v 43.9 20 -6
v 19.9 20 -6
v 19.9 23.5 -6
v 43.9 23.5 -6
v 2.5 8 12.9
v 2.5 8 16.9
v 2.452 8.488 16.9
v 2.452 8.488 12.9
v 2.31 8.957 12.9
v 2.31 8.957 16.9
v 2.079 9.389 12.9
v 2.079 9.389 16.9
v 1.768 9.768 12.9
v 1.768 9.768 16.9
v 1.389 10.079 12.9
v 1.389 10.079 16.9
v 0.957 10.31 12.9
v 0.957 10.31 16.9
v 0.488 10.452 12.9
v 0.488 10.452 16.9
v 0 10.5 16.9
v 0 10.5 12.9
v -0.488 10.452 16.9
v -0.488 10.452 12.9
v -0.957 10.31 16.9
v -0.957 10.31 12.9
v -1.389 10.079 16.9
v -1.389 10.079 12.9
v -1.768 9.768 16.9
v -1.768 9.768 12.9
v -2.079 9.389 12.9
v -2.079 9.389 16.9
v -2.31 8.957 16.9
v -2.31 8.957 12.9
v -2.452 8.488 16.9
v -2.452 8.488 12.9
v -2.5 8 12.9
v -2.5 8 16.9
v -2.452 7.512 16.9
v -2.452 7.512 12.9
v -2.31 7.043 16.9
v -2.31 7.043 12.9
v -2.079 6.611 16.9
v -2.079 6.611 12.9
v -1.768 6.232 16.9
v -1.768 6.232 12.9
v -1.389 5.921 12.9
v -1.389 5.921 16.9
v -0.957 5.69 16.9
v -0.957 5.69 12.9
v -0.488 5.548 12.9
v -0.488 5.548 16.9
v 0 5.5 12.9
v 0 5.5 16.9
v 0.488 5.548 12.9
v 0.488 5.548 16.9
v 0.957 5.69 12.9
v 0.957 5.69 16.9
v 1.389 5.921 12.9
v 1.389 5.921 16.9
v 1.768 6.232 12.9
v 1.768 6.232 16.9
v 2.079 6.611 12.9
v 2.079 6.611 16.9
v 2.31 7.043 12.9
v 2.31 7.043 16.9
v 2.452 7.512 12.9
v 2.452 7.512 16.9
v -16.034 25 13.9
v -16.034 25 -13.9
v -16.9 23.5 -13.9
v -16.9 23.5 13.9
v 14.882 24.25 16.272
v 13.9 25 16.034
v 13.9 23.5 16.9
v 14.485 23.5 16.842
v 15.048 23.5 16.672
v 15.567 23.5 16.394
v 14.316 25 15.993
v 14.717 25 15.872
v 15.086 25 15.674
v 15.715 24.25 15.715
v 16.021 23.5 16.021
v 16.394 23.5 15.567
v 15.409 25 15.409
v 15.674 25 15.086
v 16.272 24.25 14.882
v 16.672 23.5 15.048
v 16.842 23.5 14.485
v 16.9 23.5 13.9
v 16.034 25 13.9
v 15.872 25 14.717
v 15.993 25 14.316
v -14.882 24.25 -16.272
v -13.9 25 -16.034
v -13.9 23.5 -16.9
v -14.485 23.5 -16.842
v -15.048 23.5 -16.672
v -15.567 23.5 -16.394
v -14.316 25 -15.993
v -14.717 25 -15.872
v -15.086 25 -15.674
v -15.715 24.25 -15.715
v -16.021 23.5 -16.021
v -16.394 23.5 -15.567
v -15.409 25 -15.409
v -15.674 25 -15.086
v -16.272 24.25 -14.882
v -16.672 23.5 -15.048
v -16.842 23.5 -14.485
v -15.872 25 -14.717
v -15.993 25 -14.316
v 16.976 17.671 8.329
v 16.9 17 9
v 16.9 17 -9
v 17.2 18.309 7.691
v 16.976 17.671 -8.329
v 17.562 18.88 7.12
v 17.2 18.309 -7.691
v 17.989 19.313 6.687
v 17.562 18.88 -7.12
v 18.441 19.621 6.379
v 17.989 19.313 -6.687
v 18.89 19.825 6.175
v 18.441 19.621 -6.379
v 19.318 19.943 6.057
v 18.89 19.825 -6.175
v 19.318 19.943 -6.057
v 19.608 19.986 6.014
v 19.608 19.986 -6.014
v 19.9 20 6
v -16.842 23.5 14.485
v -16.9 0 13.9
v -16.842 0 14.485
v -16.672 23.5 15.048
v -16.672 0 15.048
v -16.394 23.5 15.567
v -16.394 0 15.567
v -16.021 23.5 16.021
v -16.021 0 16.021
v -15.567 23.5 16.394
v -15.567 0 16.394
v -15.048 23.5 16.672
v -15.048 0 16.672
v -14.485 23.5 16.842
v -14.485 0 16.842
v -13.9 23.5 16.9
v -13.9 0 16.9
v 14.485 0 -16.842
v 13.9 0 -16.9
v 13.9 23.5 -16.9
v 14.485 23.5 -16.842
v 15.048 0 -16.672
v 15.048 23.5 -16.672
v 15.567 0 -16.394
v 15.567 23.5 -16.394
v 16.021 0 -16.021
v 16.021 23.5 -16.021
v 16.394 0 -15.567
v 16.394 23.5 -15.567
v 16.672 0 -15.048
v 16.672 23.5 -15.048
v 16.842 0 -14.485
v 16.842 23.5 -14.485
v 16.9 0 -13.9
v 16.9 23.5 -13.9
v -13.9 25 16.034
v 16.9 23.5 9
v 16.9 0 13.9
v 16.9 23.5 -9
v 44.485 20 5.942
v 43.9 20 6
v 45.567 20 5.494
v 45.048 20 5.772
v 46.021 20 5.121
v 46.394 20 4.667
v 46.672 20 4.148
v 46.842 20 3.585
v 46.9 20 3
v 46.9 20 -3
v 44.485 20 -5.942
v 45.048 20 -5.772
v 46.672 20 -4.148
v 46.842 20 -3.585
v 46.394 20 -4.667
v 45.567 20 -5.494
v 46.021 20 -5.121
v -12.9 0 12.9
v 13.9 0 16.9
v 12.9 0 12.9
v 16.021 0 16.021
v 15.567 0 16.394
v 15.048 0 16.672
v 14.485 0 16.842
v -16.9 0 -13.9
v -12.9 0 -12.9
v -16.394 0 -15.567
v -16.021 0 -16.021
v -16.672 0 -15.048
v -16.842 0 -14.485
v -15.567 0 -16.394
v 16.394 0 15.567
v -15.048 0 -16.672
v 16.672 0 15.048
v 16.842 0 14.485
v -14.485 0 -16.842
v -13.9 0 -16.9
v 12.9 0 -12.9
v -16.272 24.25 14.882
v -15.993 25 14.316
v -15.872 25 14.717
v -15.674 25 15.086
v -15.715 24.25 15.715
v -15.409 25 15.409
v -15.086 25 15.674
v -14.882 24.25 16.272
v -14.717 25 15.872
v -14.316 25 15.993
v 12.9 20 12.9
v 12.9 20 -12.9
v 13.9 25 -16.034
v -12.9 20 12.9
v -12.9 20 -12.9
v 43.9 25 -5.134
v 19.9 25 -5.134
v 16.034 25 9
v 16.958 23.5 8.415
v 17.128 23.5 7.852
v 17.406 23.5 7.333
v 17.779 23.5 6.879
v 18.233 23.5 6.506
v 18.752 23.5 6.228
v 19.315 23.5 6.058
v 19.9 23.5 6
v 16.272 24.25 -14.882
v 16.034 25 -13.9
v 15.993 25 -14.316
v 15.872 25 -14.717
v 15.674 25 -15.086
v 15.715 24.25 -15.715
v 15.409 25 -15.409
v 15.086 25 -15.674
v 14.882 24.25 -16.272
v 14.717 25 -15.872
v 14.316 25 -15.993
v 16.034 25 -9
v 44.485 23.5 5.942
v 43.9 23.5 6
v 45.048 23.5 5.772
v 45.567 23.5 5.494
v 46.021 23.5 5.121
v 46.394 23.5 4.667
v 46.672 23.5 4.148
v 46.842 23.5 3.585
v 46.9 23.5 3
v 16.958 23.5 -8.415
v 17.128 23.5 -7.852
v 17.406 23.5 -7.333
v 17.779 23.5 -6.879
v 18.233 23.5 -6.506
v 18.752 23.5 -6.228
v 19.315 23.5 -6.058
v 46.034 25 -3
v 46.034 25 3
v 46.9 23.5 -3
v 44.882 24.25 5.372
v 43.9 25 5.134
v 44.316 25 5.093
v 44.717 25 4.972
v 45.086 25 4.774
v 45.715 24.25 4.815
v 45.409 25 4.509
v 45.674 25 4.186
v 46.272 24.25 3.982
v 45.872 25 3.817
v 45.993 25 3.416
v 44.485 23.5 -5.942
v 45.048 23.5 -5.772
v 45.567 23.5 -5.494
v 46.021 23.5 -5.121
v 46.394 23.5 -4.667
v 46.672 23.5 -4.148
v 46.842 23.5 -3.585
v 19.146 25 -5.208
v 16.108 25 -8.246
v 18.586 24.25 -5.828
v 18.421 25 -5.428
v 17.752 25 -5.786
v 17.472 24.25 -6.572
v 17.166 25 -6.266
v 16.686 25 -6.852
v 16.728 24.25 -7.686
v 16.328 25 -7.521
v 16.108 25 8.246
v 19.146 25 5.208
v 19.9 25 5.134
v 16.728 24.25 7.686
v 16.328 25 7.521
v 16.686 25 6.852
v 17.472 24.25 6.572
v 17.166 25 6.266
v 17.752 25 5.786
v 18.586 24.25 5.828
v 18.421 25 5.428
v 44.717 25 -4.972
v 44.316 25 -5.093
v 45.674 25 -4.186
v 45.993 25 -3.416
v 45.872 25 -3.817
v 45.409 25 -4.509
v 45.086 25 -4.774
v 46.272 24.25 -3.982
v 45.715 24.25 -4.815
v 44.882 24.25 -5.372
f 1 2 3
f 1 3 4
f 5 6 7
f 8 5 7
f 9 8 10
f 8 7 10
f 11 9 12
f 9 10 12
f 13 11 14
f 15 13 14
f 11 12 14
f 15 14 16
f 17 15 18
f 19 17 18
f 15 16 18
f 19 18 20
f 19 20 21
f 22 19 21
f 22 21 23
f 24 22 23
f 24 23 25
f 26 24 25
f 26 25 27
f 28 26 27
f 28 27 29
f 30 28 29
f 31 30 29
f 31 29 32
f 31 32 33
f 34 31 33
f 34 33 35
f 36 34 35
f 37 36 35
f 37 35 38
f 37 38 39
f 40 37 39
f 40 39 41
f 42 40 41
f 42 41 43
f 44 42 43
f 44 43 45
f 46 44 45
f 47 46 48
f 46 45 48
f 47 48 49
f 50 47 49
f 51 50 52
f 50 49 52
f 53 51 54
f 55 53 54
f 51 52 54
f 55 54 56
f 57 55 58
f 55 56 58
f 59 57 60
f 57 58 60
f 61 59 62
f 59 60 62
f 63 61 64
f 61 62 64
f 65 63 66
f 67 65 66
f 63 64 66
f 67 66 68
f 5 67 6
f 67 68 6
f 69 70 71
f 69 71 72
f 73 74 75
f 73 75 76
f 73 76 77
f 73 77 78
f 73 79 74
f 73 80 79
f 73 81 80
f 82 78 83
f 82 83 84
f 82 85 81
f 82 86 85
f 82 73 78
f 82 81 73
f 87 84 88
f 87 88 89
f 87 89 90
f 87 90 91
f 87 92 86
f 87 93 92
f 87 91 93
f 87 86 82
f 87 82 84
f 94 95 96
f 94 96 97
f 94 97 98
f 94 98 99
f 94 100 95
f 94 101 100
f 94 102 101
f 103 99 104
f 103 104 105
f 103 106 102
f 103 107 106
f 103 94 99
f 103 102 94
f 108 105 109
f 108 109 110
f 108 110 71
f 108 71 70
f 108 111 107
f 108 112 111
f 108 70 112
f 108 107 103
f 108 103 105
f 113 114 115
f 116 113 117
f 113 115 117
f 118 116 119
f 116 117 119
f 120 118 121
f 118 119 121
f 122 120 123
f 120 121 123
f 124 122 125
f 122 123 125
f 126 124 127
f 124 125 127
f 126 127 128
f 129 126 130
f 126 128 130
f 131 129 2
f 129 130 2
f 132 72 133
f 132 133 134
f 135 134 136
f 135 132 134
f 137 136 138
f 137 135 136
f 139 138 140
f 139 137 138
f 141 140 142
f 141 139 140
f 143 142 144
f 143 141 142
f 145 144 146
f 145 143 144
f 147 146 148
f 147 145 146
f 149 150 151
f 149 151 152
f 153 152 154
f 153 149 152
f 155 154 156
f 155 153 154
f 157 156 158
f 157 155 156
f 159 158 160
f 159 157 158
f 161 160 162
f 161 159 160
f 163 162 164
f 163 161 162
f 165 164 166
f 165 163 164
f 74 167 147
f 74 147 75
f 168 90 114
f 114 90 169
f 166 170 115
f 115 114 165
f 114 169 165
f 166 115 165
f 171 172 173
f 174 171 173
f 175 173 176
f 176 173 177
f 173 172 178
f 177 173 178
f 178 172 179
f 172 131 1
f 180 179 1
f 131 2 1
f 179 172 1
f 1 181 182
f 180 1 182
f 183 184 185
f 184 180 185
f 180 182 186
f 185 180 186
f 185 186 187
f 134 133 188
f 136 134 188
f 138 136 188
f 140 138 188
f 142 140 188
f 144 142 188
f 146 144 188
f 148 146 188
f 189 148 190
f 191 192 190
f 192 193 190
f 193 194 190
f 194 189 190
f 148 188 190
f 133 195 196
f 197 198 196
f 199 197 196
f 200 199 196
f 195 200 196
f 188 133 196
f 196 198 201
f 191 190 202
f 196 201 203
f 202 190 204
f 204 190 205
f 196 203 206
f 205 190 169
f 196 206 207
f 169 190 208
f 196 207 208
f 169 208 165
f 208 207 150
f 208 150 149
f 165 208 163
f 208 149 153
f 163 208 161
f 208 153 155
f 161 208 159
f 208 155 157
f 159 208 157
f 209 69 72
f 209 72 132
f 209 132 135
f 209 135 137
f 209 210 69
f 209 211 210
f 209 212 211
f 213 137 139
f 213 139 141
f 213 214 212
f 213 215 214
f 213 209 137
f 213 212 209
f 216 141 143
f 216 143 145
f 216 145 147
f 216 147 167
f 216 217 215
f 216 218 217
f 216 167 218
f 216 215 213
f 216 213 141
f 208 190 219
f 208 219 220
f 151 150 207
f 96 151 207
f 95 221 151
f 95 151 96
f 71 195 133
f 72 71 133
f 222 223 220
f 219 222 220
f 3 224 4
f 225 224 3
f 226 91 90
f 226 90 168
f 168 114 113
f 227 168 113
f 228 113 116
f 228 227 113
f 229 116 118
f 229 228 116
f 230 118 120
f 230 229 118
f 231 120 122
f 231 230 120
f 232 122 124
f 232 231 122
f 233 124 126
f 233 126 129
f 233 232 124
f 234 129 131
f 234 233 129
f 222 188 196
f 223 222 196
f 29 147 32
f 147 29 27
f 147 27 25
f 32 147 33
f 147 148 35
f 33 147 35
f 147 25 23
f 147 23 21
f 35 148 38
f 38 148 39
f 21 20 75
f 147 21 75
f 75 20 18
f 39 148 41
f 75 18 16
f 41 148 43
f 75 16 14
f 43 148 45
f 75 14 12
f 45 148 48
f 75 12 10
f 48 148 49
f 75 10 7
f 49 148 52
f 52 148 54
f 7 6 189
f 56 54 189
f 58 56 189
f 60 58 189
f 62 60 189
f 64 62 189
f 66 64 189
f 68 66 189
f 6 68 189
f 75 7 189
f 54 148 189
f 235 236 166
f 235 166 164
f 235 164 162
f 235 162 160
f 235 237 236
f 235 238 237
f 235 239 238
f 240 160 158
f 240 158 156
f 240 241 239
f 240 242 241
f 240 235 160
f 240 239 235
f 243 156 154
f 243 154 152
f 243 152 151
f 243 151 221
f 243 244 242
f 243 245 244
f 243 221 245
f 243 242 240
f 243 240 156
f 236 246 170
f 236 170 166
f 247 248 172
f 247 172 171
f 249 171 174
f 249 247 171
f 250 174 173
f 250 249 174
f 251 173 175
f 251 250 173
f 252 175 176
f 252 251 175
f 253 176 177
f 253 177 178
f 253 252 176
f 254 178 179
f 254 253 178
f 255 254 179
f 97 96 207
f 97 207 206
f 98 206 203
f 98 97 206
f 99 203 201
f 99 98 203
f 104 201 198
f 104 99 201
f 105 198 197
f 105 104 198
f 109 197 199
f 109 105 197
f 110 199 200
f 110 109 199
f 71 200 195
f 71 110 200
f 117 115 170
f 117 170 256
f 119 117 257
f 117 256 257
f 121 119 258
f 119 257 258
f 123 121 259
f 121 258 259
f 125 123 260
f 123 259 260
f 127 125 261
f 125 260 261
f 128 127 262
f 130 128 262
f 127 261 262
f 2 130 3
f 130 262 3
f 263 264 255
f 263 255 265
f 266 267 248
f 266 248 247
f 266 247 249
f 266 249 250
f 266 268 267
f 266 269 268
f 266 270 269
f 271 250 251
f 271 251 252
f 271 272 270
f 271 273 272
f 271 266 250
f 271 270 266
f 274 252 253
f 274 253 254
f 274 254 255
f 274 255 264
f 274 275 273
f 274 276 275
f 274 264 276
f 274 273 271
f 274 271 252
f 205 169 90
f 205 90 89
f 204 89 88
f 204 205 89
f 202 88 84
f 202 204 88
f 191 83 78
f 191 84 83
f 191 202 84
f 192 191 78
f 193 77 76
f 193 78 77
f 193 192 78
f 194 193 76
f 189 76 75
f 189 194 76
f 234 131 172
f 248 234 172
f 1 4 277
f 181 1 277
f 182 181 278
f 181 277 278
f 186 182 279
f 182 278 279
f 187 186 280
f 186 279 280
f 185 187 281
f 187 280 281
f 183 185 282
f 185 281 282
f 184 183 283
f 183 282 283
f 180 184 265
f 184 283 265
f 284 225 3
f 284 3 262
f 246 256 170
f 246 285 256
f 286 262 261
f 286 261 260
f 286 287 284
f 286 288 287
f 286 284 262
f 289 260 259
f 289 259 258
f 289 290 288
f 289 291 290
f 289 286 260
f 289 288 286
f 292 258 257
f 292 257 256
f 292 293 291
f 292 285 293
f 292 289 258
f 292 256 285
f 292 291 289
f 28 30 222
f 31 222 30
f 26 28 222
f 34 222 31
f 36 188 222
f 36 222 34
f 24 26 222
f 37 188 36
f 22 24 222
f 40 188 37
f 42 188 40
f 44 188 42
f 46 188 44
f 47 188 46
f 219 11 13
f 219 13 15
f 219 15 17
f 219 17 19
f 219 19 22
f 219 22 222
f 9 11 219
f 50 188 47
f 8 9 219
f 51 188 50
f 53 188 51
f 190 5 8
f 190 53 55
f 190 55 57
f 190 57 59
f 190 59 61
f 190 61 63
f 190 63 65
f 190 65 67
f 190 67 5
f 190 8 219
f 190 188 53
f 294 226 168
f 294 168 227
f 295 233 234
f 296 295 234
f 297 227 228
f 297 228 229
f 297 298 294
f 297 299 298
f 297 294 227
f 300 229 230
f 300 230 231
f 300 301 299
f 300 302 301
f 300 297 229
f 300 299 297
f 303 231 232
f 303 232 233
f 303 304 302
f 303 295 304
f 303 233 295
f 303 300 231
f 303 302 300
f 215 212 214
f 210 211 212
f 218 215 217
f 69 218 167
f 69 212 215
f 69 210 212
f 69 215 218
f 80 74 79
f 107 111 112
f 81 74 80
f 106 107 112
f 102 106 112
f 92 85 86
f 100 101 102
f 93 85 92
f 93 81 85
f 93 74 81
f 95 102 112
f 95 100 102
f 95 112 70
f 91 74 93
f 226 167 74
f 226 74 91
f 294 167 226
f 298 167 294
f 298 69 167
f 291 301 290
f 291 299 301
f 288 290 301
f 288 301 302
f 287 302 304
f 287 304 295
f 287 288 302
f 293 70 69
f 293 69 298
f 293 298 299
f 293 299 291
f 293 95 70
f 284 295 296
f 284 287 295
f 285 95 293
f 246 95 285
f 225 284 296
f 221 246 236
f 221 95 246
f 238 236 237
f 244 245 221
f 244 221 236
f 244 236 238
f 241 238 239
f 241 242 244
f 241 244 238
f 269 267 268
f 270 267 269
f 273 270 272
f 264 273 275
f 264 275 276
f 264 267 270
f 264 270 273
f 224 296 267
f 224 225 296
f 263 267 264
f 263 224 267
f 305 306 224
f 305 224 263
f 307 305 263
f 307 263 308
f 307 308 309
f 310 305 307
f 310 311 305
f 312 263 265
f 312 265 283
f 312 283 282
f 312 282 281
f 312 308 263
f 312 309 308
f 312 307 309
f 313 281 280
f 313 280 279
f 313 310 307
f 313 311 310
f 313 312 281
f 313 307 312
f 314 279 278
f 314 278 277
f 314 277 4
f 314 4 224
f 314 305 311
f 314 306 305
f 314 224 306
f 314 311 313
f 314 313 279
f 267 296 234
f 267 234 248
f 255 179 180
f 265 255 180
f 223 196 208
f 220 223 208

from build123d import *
from OCP.BRepFilletAPI import BRepFilletAPI_MakeChamfer

# Parameters (mm, degrees)
SKETCH1_W           = 33.8
SKETCH1_H           = 33.8
SKETCH1_W_2         = 25.8
SKETCH1_H_2         = 25.8
BOSS_EXTRUDE1_DEPTH = 20
SKETCH2_W           = 30
SKETCH2_H           = 12
SKETCH2_W_2         = 25.8
SKETCH2_H_2         = 25.8
BOSS_EXTRUDE2_DEPTH = 5
CUT_EXTRUDE1_REACH  = 64.985
SKETCH3_R           = 2.5
FILLET1_R           = 3
CHAMFER1_SIZE       = 1.5
CHAMFER1_SIZE2      = 0.866025404


with BuildPart() as part:
    # Sketch1 → Boss-Extrude1 (new body)
    with BuildSketch(Plane(origin=(0, 0, 0), x_dir=(1, 0, 0), z_dir=(0, 1, 0))):
        Rectangle(SKETCH1_W, SKETCH1_H)
        Rectangle(SKETCH1_W_2, SKETCH1_H_2, mode=Mode.SUBTRACT)
    extrude(amount=BOSS_EXTRUDE1_DEPTH)

    # Sketch2 → Boss-Extrude2 (add)
    # profile 1 of 3: a face of its own
    with BuildSketch(Plane(origin=(0, 20, 0), x_dir=(1, 0, 0), z_dir=(0, 1, 0))):
        with Locations((31.9, 0)):
            Rectangle(SKETCH2_W, SKETCH2_H)
    # profile 2 of 3: a face of its own
    with BuildSketch(Plane(origin=(0, 20, 0), x_dir=(1, 0, 0), z_dir=(0, 1, 0))):
        Polygon((16.9, 16.9), (-16.9, 16.9), (-16.9, -16.9), (16.9, -16.9), (16.9, -6), (16.9, 6), align=None)
        Rectangle(SKETCH2_W_2, SKETCH2_H_2, mode=Mode.SUBTRACT)
    # profile 3 of 3: a face of its own
    with BuildSketch(Plane(origin=(0, 20, 0), x_dir=(1, 0, 0), z_dir=(0, 1, 0))):
        Rectangle(SKETCH2_W_2, SKETCH2_H_2)
    extrude(amount=BOSS_EXTRUDE2_DEPTH)

    # Sketch3 → Cut-Extrude1 (cut, up to next)
    with BuildSketch(Plane.XY.offset(16.9), mode=Mode.PRIVATE) as cut_extrude1_sk1:
        with Locations((0, 8)):
            Circle(SKETCH3_R)
    cut_extrude1_tool1 = extrude(cut_extrude1_sk1.sketch, amount=-CUT_EXTRUDE1_REACH, mode=Mode.PRIVATE) & part.part
    add(cut_extrude1_tool1.solids().sort_by_distance((0, 8, 16.9))[0], mode=Mode.SUBTRACT)

    # Fillet1
    fillet1_edges = [part.edges().sort_by_distance(p)[0] for p in [
        (16.9, 20, 0),
        (16.9, 22.5, 6),
        (46.9, 22.5, 6),
        (46.9, 22.5, -6),
        (16.9, 22.5, -6),
        (-16.9, 12.5, 16.9),
        (-16.9, 12.5, -16.9),
        (16.9, 12.5, -16.9),
        (16.9, 12.5, 16.9),
    ]]
    fillet(fillet1_edges, radius=FILLET1_R)

    # Chamfer1: one chamfer whose edges measure the first distance from different faces: ONE call of the kernel's chamfer builder (chamfer() names one face for all edges)
    chamfer1_edges_1 = [part.edges().sort_by_distance(p)[0] for p in [
        (16.9, 25, -11.45),
        (16.9, 25, 11.45),
    ]]
    chamfer1_side_1 = [part.faces().sort_by_distance(p)[0] for p in [
        (16.9, 10.278584392, 0),
    ]]
    chamfer1_edges_2 = [part.edges().sort_by_distance(p)[0] for p in [
        (0, 25, 16.9),
    ]]
    chamfer1_side_2 = [part.faces().sort_by_distance(p)[0] for p in [
        (0, 12.63082894, 16.9),
    ]]
    chamfer1_edges_3 = [part.edges().sort_by_distance(p)[0] for p in [
        (31.9, 25, 6),
    ]]
    chamfer1_side_3 = [part.faces().sort_by_distance(p)[0] for p in [
        (31.9, 22.5, 6),
    ]]
    chamfer1_edges_4 = [part.edges().sort_by_distance(p)[0] for p in [
        (46.9, 25, 0),
    ]]
    chamfer1_side_4 = [part.faces().sort_by_distance(p)[0] for p in [
        (46.9, 22.5, 0),
    ]]
    chamfer1_edges_5 = [part.edges().sort_by_distance(p)[0] for p in [
        (31.9, 25, -6),
    ]]
    chamfer1_side_5 = [part.faces().sort_by_distance(p)[0] for p in [
        (31.9, 22.5, -6),
    ]]
    chamfer1_edges_6 = [part.edges().sort_by_distance(p)[0] for p in [
        (0, 25, -16.9),
    ]]
    chamfer1_side_6 = [part.faces().sort_by_distance(p)[0] for p in [
        (0, 12.5, -16.9),
    ]]
    chamfer1_edges_7 = [part.edges().sort_by_distance(p)[0] for p in [
        (-16.9, 25, 0),
    ]]
    chamfer1_side_7 = [part.faces().sort_by_distance(p)[0] for p in [
        (-16.9, 12.5, 0),
    ]]
    chamfer1_edges_8 = [part.edges().sort_by_distance(p)[0] for p in [
        (46.021320344, 25, 5.121320344),
    ]]
    chamfer1_side_8 = [part.faces().sort_by_distance(p)[0] for p in [
        (46.021320344, 22.5, 5.121320344),
    ]]
    chamfer1_edges_9 = [part.edges().sort_by_distance(p)[0] for p in [
        (46.021320344, 25, -5.121320344),
    ]]
    chamfer1_side_9 = [part.faces().sort_by_distance(p)[0] for p in [
        (46.021320344, 22.5, -5.121320344),
    ]]
    chamfer1_edges_10 = [part.edges().sort_by_distance(p)[0] for p in [
        (16.021320344, 25, -16.021320344),
    ]]
    chamfer1_side_10 = [part.faces().sort_by_distance(p)[0] for p in [
        (16.021320344, 12.5, -16.021320344),
    ]]
    chamfer1_edges_11 = [part.edges().sort_by_distance(p)[0] for p in [
        (-16.021320344, 25, -16.021320344),
    ]]
    chamfer1_side_11 = [part.faces().sort_by_distance(p)[0] for p in [
        (-16.021320344, 12.5, -16.021320344),
    ]]
    chamfer1_edges_12 = [part.edges().sort_by_distance(p)[0] for p in [
        (-16.021320344, 25, 16.021320344),
    ]]
    chamfer1_side_12 = [part.faces().sort_by_distance(p)[0] for p in [
        (-16.021320344, 12.5, 16.021320344),
    ]]
    chamfer1_edges_13 = [part.edges().sort_by_distance(p)[0] for p in [
        (16.021320344, 25, 16.021320344),
    ]]
    chamfer1_side_13 = [part.faces().sort_by_distance(p)[0] for p in [
        (16.021320344, 12.5, 16.021320344),
    ]]
    chamfer1_edges_14 = [part.edges().sort_by_distance(p)[0] for p in [
        (17.778679656, 25, -6.878679656),
    ]]
    chamfer1_side_14 = [part.faces().sort_by_distance(p)[0] for p in [
        (17.778679656, 21, -6.878679656),
    ]]
    chamfer1_edges_15 = [part.edges().sort_by_distance(p)[0] for p in [
        (17.778679656, 25, 6.878679656),
    ]]
    chamfer1_side_15 = [part.faces().sort_by_distance(p)[0] for p in [
        (17.778679656, 21, 6.878679656),
    ]]
    chamfer1 = BRepFilletAPI_MakeChamfer(part.part.solid().wrapped)
    for e in chamfer1_edges_1:
        chamfer1.Add(CHAMFER1_SIZE, CHAMFER1_SIZE2, e.wrapped, chamfer1_side_1[0].wrapped)  # the first distance lies on this face
    for e in chamfer1_edges_2:
        chamfer1.Add(CHAMFER1_SIZE, CHAMFER1_SIZE2, e.wrapped, chamfer1_side_2[0].wrapped)  # the first distance lies on this face
    for e in chamfer1_edges_3:
        chamfer1.Add(CHAMFER1_SIZE, CHAMFER1_SIZE2, e.wrapped, chamfer1_side_3[0].wrapped)  # the first distance lies on this face
    for e in chamfer1_edges_4:
        chamfer1.Add(CHAMFER1_SIZE, CHAMFER1_SIZE2, e.wrapped, chamfer1_side_4[0].wrapped)  # the first distance lies on this face
    for e in chamfer1_edges_5:
        chamfer1.Add(CHAMFER1_SIZE, CHAMFER1_SIZE2, e.wrapped, chamfer1_side_5[0].wrapped)  # the first distance lies on this face
    for e in chamfer1_edges_6:
        chamfer1.Add(CHAMFER1_SIZE, CHAMFER1_SIZE2, e.wrapped, chamfer1_side_6[0].wrapped)  # the first distance lies on this face
    for e in chamfer1_edges_7:
        chamfer1.Add(CHAMFER1_SIZE, CHAMFER1_SIZE2, e.wrapped, chamfer1_side_7[0].wrapped)  # the first distance lies on this face
    for e in chamfer1_edges_8:
        chamfer1.Add(CHAMFER1_SIZE, CHAMFER1_SIZE2, e.wrapped, chamfer1_side_8[0].wrapped)  # the first distance lies on this face
    for e in chamfer1_edges_9:
        chamfer1.Add(CHAMFER1_SIZE, CHAMFER1_SIZE2, e.wrapped, chamfer1_side_9[0].wrapped)  # the first distance lies on this face
    for e in chamfer1_edges_10:
        chamfer1.Add(CHAMFER1_SIZE, CHAMFER1_SIZE2, e.wrapped, chamfer1_side_10[0].wrapped)  # the first distance lies on this face
    for e in chamfer1_edges_11:
        chamfer1.Add(CHAMFER1_SIZE, CHAMFER1_SIZE2, e.wrapped, chamfer1_side_11[0].wrapped)  # the first distance lies on this face
    for e in chamfer1_edges_12:
        chamfer1.Add(CHAMFER1_SIZE, CHAMFER1_SIZE2, e.wrapped, chamfer1_side_12[0].wrapped)  # the first distance lies on this face
    for e in chamfer1_edges_13:
        chamfer1.Add(CHAMFER1_SIZE, CHAMFER1_SIZE2, e.wrapped, chamfer1_side_13[0].wrapped)  # the first distance lies on this face
    for e in chamfer1_edges_14:
        chamfer1.Add(CHAMFER1_SIZE, CHAMFER1_SIZE2, e.wrapped, chamfer1_side_14[0].wrapped)  # the first distance lies on this face
    for e in chamfer1_edges_15:
        chamfer1.Add(CHAMFER1_SIZE, CHAMFER1_SIZE2, e.wrapped, chamfer1_side_15[0].wrapped)  # the first distance lies on this face
    add(Compound.cast(chamfer1.Shape()), mode=Mode.REPLACE)


solid = part.part
